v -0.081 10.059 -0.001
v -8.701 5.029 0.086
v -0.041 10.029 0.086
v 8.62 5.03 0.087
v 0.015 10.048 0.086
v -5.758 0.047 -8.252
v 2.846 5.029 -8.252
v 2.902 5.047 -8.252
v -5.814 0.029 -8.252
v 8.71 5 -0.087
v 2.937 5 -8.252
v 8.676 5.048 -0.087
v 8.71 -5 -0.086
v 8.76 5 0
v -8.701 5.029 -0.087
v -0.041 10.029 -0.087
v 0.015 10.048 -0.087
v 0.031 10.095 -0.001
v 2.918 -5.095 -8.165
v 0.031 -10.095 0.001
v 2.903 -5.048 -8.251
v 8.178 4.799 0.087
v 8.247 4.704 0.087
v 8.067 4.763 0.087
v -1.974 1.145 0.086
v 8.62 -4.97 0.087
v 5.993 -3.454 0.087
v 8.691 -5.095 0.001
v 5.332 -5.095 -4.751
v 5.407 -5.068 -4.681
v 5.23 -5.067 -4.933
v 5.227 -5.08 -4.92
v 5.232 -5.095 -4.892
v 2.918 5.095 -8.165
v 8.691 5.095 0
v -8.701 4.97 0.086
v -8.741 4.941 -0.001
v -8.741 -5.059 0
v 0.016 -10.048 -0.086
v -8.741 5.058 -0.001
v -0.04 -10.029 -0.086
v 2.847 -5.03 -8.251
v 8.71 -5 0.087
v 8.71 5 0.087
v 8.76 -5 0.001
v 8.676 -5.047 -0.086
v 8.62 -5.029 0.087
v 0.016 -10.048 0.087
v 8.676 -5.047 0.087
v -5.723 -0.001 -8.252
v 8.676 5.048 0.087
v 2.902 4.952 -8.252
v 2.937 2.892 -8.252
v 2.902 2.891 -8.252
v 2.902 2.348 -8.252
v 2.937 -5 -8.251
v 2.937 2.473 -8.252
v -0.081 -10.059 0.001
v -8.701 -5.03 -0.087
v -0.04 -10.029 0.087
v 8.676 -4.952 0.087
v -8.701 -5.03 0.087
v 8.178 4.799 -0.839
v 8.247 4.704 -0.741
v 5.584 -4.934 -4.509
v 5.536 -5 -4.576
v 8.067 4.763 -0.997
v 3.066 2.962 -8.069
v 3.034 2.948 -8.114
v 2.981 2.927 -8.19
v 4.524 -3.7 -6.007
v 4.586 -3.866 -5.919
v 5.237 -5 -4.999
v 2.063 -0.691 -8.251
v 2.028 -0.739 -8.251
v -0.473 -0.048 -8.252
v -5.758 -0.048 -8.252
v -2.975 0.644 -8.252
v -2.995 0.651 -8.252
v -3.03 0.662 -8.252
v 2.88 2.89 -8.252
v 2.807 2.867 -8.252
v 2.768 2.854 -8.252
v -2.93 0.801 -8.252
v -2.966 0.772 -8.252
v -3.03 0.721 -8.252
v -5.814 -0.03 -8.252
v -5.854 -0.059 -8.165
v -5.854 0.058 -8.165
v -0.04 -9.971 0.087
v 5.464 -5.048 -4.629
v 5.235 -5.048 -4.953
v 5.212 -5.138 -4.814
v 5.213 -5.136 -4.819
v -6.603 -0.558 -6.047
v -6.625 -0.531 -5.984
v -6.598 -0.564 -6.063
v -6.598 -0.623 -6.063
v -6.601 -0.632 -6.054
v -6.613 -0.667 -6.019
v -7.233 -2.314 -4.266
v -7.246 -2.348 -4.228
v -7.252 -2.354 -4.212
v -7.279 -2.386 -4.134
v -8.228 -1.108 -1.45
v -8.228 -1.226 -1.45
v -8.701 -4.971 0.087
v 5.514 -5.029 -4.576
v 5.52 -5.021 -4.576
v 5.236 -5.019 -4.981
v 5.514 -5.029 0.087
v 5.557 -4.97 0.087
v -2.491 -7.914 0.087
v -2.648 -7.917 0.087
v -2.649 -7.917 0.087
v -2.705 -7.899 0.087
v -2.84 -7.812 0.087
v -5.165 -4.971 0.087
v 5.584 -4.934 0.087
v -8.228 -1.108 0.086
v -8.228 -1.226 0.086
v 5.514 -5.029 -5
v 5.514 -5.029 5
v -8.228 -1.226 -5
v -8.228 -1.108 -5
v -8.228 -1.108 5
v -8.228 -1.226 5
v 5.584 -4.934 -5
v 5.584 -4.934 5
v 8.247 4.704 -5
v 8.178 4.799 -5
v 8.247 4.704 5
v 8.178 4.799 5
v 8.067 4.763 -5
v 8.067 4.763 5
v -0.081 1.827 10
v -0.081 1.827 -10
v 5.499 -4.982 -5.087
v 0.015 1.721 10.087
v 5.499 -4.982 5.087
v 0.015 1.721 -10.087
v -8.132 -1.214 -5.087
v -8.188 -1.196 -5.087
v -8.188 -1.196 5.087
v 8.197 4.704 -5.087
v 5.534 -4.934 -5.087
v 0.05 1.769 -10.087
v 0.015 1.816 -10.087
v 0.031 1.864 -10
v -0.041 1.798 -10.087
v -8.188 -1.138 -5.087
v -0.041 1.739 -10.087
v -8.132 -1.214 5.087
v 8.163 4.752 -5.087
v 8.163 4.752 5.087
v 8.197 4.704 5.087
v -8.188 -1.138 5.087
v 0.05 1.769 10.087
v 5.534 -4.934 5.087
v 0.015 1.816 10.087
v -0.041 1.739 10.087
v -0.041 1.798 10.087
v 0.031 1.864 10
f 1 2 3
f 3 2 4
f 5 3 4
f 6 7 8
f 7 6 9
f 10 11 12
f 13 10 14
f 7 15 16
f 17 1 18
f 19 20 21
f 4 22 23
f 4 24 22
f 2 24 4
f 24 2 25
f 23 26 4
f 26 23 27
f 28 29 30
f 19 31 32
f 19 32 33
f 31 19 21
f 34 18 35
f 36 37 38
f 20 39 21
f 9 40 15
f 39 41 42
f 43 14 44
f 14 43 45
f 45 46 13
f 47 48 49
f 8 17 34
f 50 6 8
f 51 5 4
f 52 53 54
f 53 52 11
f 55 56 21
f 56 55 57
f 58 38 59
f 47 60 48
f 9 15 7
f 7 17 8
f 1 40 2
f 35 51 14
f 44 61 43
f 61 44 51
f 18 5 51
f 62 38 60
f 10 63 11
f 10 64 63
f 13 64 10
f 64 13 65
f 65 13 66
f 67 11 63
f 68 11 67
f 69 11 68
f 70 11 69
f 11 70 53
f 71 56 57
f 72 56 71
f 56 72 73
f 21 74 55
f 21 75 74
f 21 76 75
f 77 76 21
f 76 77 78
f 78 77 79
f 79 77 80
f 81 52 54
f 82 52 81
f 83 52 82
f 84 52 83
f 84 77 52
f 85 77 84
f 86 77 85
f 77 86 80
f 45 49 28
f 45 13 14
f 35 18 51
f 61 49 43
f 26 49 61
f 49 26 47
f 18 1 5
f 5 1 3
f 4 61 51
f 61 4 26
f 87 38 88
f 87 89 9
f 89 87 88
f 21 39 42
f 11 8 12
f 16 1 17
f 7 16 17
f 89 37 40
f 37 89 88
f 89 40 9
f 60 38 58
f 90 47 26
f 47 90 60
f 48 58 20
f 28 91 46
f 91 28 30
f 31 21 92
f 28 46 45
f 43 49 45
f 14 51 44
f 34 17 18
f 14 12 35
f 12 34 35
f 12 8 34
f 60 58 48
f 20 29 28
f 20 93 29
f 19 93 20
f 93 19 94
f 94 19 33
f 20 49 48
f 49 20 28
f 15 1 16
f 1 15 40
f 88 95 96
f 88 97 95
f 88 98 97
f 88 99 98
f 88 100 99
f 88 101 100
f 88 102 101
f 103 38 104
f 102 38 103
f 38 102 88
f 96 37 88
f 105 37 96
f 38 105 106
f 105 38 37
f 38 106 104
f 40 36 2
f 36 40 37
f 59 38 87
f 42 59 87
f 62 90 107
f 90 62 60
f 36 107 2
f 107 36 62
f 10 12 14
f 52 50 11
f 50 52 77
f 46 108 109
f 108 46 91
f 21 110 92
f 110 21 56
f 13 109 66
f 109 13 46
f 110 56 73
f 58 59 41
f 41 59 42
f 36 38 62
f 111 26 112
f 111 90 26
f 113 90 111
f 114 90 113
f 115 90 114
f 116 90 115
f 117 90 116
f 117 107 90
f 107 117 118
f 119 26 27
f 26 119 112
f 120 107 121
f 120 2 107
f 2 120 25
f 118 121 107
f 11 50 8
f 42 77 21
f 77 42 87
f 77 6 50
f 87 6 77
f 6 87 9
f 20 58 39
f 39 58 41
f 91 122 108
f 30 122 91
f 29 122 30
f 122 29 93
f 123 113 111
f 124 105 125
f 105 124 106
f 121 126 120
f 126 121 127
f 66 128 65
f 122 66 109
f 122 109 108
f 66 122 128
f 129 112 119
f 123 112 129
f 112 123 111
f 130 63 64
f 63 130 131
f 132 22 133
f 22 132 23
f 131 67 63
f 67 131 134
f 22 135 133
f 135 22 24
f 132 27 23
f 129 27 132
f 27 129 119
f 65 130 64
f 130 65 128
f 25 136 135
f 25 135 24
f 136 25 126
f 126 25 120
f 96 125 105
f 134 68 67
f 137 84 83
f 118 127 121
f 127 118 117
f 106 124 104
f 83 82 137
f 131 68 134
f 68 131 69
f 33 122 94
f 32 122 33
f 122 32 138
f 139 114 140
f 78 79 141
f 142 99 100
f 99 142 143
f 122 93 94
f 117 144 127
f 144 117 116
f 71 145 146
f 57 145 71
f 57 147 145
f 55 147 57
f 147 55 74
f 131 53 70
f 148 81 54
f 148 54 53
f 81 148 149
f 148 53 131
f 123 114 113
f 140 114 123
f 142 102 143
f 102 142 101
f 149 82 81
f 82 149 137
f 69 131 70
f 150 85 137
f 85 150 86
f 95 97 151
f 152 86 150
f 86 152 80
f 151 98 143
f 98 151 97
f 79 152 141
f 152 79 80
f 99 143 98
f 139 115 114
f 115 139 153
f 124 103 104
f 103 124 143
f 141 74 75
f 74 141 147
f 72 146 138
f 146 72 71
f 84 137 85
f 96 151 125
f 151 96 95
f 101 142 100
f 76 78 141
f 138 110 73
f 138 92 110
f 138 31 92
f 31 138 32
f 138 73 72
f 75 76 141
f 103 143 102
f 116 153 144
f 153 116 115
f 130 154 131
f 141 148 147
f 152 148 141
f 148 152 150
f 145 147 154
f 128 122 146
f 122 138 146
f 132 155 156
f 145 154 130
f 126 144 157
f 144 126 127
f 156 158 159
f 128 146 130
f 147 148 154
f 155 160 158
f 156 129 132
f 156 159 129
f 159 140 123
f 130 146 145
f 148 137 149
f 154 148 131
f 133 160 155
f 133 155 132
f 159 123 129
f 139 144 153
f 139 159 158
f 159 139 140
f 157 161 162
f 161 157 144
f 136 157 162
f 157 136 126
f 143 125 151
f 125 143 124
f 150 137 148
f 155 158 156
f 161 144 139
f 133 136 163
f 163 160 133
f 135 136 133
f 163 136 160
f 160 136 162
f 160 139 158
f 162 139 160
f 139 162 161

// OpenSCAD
// Auto-generated OpenSCAD file

    inner_points = 10*[[0.5483513328711939, -0.49343059621073404, 0.5000000000001427], [-0.8147584849794822, -0.1166924584026583, 0.5000000000000114], [0.8147454248469246, 0.4704335994932656, -0.5000000000000114], [-0.2664006220419612, -0.7869936251588691, 1.539879335155092e-13], [-6.530066327234646e-06, 0.17687057054547678, 1.0], [-6.5300662304823955e-06, 0.1768705705451305, -1.0], [0.5483513328712422, -0.4934305962109071, -0.4999999999998575], [-0.8147584849794339, -0.11669245840283138, -0.4999999999999886], [0.8147454248468763, 0.47043359949343866, 0.4999999999999886]];

    outer_points = 10*[[0.2886841223116632, 0.4999680237807507, -0.8165129838048599], [0.8660438627157157, -0.4999680237807507, 5.5219683157359256e-05], [-0.8660438627157157, 0.4999680237807507, -5.5219683157359256e-05], [0.2887210423333781, -0.5000319741744229, -0.8164607672859469], [0.8660069426940007, 0.5000319741744229, 3.0031642442862605e-06], [-0.8660069426940007, -0.5000319741744229, -3.0031642442862605e-06], [-0.5773228203823376, -6.395039367218525e-05, -0.8165159869691043], [3.692002171488182e-05, -0.9999999979551737, 5.221651891308081e-05], [-3.692002171488182e-05, 0.9999999979551737, -5.221651891308081e-05]];

    // Convex hull for inner set (I)
    module inner_hull() {
        hull() {
            for (p = inner_points) {
                translate(p) sphere(r=0.1);
            }
        }
    }

    // Convex hull for outer set (O) minus inner hull (O \ I)
    module outer_minus_inner() {
        difference() {
            hull() {
                for (p = outer_points) {
                    translate(p) sphere(r=0.1);
                }
            }
            inner_hull(); // Subtract inner hull
        }
    }

    // Convex hull for outer set (O) minus all translated inner hulls
    module outer_minus_AllTranslationInner() {
        difference() {
            hull() {
                for (p = outer_points) {
                    translate(p) sphere(r=0.1);
                }
            }
            hull() {
                translate([0,0,50]) inner_hull();
                translate([0,0,-50]) inner_hull();
            }; // Subtract translated inner hulls
        }
    }

    // Difference between outer_minus_inner and outer_minus_AllTranslationInner
    module outer_minus_inner_diff() {
        difference() {
            // Outer minus inner
            difference() {
                hull() {
                    for (p = outer_points) {
                        translate(p) sphere(r=0.1);
                    }
                }
                inner_hull();
            }

            // Subtract Outer minus AllTranslationInner
            difference() {
                hull() {
                    for (p = outer_points) {
                        translate(p) sphere(r=0.1);
                    }
                }
                hull() {
                    translate([0,0,50]) inner_hull();
                    translate([0,0,-50]) inner_hull();
                };
            }
        }
    }

    // Rendering all with colors applied
    color([1, 0, 0, 0.5]) inner_hull(); // Transparent red
    color([0, 1, 0, 1]) outer_minus_AllTranslationInner(); // Opaque green
    color([1, 1, 0, 1]) outer_minus_inner_diff(); // Opaque yellow
    
